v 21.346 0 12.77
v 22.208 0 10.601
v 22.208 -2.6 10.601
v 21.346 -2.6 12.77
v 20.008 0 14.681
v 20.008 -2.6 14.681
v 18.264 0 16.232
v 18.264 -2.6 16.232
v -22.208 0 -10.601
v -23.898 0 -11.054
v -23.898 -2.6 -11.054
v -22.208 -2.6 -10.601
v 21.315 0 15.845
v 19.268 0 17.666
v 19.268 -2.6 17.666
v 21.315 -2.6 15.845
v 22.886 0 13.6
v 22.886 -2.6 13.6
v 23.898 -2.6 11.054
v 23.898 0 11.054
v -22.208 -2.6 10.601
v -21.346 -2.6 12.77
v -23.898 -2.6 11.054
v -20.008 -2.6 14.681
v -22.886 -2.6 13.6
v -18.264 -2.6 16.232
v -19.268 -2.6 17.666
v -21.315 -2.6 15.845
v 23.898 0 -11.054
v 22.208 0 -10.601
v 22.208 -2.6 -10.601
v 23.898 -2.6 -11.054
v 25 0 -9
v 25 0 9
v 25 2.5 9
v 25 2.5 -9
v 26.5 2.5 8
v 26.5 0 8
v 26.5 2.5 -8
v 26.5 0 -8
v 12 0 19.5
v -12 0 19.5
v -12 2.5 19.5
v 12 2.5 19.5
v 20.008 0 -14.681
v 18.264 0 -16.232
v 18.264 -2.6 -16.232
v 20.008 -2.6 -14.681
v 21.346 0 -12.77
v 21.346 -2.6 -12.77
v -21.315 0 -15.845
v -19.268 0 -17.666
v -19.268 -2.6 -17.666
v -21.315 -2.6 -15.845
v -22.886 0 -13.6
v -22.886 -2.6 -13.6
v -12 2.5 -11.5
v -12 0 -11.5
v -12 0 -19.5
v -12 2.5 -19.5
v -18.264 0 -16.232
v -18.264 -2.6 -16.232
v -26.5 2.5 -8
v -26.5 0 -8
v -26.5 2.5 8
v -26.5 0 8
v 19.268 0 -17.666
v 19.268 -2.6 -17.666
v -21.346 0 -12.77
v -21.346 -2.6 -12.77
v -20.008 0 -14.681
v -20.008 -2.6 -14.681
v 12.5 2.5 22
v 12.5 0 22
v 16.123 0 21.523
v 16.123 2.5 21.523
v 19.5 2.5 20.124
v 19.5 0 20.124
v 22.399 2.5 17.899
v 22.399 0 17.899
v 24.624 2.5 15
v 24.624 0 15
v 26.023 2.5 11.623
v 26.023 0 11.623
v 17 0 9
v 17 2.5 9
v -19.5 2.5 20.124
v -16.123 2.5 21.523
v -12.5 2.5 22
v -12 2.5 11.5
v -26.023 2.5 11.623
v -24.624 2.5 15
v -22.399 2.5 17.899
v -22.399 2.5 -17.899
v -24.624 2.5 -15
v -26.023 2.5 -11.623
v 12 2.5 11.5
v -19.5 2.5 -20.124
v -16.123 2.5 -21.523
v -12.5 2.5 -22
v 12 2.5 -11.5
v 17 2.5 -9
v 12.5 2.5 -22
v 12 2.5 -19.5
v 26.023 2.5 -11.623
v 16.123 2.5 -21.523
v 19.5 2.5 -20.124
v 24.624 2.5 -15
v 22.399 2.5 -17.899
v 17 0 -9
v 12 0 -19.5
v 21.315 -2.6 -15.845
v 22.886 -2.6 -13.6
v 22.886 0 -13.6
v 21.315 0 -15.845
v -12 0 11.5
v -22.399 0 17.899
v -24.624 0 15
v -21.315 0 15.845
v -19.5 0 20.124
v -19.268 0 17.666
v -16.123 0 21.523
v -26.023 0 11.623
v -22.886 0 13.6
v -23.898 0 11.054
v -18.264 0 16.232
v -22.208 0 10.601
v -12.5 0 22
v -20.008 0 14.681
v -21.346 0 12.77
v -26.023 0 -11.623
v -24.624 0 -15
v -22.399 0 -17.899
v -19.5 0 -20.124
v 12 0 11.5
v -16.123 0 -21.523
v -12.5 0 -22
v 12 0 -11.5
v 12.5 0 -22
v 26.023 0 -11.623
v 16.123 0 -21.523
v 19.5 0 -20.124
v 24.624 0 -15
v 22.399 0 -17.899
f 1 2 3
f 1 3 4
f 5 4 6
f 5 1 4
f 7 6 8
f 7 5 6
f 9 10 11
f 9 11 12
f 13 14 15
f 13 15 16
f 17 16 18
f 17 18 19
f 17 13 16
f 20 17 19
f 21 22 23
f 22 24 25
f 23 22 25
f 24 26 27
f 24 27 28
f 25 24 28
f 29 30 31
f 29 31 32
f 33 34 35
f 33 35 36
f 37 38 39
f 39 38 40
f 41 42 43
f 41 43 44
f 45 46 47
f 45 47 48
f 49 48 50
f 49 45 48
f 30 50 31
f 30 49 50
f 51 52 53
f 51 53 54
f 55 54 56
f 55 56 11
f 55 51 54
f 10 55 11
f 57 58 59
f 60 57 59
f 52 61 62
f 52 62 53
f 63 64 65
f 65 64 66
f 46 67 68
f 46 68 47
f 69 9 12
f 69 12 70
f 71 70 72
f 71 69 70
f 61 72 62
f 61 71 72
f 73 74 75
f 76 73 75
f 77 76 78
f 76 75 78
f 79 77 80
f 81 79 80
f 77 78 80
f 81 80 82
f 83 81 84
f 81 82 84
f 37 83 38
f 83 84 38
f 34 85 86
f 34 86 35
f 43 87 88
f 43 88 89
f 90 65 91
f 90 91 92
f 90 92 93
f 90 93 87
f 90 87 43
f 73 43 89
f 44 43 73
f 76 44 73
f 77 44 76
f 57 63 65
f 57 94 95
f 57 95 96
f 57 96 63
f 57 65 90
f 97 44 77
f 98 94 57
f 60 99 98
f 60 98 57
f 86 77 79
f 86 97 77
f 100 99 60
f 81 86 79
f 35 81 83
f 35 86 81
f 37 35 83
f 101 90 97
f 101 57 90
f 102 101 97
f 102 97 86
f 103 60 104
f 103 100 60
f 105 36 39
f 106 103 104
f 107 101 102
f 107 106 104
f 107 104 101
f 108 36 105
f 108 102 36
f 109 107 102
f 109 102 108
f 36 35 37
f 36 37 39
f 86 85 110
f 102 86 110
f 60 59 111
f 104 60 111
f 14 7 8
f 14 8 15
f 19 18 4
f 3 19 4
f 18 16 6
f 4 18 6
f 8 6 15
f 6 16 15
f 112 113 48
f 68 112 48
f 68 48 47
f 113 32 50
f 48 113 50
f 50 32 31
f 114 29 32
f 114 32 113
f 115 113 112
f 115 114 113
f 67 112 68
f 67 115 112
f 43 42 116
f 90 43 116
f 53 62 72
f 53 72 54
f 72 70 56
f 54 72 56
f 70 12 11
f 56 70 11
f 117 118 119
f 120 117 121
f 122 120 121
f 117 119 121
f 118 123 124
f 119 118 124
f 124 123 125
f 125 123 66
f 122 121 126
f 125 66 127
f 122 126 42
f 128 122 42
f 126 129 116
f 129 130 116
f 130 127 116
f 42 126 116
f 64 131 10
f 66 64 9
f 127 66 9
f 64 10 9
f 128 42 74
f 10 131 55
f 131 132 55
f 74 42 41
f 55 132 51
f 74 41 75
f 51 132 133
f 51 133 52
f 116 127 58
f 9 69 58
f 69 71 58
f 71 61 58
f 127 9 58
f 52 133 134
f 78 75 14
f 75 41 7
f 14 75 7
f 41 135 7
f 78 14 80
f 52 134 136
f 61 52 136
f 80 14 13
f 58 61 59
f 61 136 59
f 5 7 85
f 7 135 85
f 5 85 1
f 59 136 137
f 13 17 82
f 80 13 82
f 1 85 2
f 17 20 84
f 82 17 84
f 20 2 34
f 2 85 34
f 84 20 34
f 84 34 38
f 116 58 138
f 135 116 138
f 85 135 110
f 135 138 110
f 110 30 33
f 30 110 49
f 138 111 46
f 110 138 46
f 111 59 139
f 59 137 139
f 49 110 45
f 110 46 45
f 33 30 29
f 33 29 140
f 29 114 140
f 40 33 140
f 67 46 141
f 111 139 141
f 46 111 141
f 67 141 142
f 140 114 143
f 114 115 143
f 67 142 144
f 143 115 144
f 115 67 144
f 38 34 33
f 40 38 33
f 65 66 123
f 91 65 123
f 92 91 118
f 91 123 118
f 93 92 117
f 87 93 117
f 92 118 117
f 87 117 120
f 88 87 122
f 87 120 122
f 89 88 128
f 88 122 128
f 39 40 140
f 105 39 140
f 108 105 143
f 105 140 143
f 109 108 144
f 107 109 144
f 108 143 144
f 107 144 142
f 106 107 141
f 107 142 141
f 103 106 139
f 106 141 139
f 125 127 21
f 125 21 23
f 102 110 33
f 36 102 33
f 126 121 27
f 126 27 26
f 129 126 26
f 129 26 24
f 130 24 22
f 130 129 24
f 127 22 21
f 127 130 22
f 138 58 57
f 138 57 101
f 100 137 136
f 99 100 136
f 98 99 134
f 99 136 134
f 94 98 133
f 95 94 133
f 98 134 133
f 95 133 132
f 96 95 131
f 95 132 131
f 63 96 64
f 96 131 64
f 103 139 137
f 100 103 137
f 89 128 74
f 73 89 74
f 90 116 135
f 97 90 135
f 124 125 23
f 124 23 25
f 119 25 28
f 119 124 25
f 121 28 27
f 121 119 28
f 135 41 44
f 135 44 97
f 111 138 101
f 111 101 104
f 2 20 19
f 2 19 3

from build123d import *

# Parameters (mm, degrees)
SKETCH1_W           = 8
SKETCH1_H           = 18
SKETCH1_W_2         = 24
SKETCH1_H_2         = 8
BOSS_EXTRUDE1_DEPTH = 2.5
BOSS_EXTRUDE2_DEPTH = 2.6


with BuildPart() as part:
    # Sketch1 → Boss-Extrude1 (new body)
    with BuildSketch(Plane(origin=(0, 0, 0), x_dir=(1, 0, 0), z_dir=(0, 1, 0))):
        with BuildLine():
            Line((-26.5, 8), (-26.5, -8))
            ThreePointArc((-26.5, -8), (-22.399494937, -17.899494937), (-12.5, -22))
            Line((-12.5, -22), (12.5, -22))
            ThreePointArc((12.5, -22), (22.399494937, -17.899494937), (26.5, -8))
            Line((26.5, -8), (26.5, 8))
            ThreePointArc((26.5, 8), (22.399494937, 17.899494937), (12.5, 22))
            Line((12.5, 22), (-12.5, 22))
            ThreePointArc((-12.5, 22), (-22.399494937, 17.899494937), (-26.5, 8))
        make_face()
        with Locations((21, 0)):
            Rectangle(SKETCH1_W, SKETCH1_H, mode=Mode.SUBTRACT)
        with Locations((0, 15.5)):
            Rectangle(SKETCH1_W_2, SKETCH1_H_2, mode=Mode.SUBTRACT)
        with Locations((0, -15.5)):
            Rectangle(SKETCH1_W_2, SKETCH1_H_2, mode=Mode.SUBTRACT)
    extrude(amount=BOSS_EXTRUDE1_DEPTH)

    # Sketch2 → Boss-Extrude2 (add)
    with BuildSketch(Plane.XZ):
        with BuildLine():
            ThreePointArc((18.264443185, -16.232478045), (20.732478045, -13.764443185), (22.207554554, -10.601131403))
            Line((22.207554554, -10.601131403), (23.89792475, -11.054064732))
            ThreePointArc((23.89792475, -11.054064732), (22.165994123, -14.768201949), (19.268201949, -17.665994123))
            Line((19.268201949, -17.665994123), (18.264443185, -16.232478045))
        make_face()
        with BuildLine():
            ThreePointArc((19.268201949, 17.665994123), (22.165994123, 14.768201949), (23.89792475, 11.054064732))
            Line((23.89792475, 11.054064732), (22.207554554, 10.601131403))
            ThreePointArc((22.207554554, 10.601131403), (20.732478045, 13.764443185), (18.264443185, 16.232478045))
            Line((18.264443185, 16.232478045), (19.268201949, 17.665994123))
        make_face()
        with BuildLine():
            Line((-18.264443185, -16.232478045), (-19.268201949, -17.665994123))
            ThreePointArc((-19.268201949, -17.665994123), (-22.165994123, -14.768201949), (-23.89792475, -11.054064732))
            Line((-23.89792475, -11.054064732), (-22.207554554, -10.601131403))
            ThreePointArc((-22.207554554, -10.601131403), (-20.732478045, -13.764443185), (-18.264443185, -16.232478045))
        make_face()
        with BuildLine():
            ThreePointArc((-18.264443185, 16.232478045), (-20.732478045, 13.764443185), (-22.207554554, 10.601131403))
            Line((-22.207554554, 10.601131403), (-23.89792475, 11.054064732))
            ThreePointArc((-23.89792475, 11.054064732), (-22.165994123, 14.768201949), (-19.268201949, 17.665994123))
            Line((-19.268201949, 17.665994123), (-18.264443185, 16.232478045))
        make_face()
    extrude(amount=BOSS_EXTRUDE2_DEPTH)


solid = part.part
